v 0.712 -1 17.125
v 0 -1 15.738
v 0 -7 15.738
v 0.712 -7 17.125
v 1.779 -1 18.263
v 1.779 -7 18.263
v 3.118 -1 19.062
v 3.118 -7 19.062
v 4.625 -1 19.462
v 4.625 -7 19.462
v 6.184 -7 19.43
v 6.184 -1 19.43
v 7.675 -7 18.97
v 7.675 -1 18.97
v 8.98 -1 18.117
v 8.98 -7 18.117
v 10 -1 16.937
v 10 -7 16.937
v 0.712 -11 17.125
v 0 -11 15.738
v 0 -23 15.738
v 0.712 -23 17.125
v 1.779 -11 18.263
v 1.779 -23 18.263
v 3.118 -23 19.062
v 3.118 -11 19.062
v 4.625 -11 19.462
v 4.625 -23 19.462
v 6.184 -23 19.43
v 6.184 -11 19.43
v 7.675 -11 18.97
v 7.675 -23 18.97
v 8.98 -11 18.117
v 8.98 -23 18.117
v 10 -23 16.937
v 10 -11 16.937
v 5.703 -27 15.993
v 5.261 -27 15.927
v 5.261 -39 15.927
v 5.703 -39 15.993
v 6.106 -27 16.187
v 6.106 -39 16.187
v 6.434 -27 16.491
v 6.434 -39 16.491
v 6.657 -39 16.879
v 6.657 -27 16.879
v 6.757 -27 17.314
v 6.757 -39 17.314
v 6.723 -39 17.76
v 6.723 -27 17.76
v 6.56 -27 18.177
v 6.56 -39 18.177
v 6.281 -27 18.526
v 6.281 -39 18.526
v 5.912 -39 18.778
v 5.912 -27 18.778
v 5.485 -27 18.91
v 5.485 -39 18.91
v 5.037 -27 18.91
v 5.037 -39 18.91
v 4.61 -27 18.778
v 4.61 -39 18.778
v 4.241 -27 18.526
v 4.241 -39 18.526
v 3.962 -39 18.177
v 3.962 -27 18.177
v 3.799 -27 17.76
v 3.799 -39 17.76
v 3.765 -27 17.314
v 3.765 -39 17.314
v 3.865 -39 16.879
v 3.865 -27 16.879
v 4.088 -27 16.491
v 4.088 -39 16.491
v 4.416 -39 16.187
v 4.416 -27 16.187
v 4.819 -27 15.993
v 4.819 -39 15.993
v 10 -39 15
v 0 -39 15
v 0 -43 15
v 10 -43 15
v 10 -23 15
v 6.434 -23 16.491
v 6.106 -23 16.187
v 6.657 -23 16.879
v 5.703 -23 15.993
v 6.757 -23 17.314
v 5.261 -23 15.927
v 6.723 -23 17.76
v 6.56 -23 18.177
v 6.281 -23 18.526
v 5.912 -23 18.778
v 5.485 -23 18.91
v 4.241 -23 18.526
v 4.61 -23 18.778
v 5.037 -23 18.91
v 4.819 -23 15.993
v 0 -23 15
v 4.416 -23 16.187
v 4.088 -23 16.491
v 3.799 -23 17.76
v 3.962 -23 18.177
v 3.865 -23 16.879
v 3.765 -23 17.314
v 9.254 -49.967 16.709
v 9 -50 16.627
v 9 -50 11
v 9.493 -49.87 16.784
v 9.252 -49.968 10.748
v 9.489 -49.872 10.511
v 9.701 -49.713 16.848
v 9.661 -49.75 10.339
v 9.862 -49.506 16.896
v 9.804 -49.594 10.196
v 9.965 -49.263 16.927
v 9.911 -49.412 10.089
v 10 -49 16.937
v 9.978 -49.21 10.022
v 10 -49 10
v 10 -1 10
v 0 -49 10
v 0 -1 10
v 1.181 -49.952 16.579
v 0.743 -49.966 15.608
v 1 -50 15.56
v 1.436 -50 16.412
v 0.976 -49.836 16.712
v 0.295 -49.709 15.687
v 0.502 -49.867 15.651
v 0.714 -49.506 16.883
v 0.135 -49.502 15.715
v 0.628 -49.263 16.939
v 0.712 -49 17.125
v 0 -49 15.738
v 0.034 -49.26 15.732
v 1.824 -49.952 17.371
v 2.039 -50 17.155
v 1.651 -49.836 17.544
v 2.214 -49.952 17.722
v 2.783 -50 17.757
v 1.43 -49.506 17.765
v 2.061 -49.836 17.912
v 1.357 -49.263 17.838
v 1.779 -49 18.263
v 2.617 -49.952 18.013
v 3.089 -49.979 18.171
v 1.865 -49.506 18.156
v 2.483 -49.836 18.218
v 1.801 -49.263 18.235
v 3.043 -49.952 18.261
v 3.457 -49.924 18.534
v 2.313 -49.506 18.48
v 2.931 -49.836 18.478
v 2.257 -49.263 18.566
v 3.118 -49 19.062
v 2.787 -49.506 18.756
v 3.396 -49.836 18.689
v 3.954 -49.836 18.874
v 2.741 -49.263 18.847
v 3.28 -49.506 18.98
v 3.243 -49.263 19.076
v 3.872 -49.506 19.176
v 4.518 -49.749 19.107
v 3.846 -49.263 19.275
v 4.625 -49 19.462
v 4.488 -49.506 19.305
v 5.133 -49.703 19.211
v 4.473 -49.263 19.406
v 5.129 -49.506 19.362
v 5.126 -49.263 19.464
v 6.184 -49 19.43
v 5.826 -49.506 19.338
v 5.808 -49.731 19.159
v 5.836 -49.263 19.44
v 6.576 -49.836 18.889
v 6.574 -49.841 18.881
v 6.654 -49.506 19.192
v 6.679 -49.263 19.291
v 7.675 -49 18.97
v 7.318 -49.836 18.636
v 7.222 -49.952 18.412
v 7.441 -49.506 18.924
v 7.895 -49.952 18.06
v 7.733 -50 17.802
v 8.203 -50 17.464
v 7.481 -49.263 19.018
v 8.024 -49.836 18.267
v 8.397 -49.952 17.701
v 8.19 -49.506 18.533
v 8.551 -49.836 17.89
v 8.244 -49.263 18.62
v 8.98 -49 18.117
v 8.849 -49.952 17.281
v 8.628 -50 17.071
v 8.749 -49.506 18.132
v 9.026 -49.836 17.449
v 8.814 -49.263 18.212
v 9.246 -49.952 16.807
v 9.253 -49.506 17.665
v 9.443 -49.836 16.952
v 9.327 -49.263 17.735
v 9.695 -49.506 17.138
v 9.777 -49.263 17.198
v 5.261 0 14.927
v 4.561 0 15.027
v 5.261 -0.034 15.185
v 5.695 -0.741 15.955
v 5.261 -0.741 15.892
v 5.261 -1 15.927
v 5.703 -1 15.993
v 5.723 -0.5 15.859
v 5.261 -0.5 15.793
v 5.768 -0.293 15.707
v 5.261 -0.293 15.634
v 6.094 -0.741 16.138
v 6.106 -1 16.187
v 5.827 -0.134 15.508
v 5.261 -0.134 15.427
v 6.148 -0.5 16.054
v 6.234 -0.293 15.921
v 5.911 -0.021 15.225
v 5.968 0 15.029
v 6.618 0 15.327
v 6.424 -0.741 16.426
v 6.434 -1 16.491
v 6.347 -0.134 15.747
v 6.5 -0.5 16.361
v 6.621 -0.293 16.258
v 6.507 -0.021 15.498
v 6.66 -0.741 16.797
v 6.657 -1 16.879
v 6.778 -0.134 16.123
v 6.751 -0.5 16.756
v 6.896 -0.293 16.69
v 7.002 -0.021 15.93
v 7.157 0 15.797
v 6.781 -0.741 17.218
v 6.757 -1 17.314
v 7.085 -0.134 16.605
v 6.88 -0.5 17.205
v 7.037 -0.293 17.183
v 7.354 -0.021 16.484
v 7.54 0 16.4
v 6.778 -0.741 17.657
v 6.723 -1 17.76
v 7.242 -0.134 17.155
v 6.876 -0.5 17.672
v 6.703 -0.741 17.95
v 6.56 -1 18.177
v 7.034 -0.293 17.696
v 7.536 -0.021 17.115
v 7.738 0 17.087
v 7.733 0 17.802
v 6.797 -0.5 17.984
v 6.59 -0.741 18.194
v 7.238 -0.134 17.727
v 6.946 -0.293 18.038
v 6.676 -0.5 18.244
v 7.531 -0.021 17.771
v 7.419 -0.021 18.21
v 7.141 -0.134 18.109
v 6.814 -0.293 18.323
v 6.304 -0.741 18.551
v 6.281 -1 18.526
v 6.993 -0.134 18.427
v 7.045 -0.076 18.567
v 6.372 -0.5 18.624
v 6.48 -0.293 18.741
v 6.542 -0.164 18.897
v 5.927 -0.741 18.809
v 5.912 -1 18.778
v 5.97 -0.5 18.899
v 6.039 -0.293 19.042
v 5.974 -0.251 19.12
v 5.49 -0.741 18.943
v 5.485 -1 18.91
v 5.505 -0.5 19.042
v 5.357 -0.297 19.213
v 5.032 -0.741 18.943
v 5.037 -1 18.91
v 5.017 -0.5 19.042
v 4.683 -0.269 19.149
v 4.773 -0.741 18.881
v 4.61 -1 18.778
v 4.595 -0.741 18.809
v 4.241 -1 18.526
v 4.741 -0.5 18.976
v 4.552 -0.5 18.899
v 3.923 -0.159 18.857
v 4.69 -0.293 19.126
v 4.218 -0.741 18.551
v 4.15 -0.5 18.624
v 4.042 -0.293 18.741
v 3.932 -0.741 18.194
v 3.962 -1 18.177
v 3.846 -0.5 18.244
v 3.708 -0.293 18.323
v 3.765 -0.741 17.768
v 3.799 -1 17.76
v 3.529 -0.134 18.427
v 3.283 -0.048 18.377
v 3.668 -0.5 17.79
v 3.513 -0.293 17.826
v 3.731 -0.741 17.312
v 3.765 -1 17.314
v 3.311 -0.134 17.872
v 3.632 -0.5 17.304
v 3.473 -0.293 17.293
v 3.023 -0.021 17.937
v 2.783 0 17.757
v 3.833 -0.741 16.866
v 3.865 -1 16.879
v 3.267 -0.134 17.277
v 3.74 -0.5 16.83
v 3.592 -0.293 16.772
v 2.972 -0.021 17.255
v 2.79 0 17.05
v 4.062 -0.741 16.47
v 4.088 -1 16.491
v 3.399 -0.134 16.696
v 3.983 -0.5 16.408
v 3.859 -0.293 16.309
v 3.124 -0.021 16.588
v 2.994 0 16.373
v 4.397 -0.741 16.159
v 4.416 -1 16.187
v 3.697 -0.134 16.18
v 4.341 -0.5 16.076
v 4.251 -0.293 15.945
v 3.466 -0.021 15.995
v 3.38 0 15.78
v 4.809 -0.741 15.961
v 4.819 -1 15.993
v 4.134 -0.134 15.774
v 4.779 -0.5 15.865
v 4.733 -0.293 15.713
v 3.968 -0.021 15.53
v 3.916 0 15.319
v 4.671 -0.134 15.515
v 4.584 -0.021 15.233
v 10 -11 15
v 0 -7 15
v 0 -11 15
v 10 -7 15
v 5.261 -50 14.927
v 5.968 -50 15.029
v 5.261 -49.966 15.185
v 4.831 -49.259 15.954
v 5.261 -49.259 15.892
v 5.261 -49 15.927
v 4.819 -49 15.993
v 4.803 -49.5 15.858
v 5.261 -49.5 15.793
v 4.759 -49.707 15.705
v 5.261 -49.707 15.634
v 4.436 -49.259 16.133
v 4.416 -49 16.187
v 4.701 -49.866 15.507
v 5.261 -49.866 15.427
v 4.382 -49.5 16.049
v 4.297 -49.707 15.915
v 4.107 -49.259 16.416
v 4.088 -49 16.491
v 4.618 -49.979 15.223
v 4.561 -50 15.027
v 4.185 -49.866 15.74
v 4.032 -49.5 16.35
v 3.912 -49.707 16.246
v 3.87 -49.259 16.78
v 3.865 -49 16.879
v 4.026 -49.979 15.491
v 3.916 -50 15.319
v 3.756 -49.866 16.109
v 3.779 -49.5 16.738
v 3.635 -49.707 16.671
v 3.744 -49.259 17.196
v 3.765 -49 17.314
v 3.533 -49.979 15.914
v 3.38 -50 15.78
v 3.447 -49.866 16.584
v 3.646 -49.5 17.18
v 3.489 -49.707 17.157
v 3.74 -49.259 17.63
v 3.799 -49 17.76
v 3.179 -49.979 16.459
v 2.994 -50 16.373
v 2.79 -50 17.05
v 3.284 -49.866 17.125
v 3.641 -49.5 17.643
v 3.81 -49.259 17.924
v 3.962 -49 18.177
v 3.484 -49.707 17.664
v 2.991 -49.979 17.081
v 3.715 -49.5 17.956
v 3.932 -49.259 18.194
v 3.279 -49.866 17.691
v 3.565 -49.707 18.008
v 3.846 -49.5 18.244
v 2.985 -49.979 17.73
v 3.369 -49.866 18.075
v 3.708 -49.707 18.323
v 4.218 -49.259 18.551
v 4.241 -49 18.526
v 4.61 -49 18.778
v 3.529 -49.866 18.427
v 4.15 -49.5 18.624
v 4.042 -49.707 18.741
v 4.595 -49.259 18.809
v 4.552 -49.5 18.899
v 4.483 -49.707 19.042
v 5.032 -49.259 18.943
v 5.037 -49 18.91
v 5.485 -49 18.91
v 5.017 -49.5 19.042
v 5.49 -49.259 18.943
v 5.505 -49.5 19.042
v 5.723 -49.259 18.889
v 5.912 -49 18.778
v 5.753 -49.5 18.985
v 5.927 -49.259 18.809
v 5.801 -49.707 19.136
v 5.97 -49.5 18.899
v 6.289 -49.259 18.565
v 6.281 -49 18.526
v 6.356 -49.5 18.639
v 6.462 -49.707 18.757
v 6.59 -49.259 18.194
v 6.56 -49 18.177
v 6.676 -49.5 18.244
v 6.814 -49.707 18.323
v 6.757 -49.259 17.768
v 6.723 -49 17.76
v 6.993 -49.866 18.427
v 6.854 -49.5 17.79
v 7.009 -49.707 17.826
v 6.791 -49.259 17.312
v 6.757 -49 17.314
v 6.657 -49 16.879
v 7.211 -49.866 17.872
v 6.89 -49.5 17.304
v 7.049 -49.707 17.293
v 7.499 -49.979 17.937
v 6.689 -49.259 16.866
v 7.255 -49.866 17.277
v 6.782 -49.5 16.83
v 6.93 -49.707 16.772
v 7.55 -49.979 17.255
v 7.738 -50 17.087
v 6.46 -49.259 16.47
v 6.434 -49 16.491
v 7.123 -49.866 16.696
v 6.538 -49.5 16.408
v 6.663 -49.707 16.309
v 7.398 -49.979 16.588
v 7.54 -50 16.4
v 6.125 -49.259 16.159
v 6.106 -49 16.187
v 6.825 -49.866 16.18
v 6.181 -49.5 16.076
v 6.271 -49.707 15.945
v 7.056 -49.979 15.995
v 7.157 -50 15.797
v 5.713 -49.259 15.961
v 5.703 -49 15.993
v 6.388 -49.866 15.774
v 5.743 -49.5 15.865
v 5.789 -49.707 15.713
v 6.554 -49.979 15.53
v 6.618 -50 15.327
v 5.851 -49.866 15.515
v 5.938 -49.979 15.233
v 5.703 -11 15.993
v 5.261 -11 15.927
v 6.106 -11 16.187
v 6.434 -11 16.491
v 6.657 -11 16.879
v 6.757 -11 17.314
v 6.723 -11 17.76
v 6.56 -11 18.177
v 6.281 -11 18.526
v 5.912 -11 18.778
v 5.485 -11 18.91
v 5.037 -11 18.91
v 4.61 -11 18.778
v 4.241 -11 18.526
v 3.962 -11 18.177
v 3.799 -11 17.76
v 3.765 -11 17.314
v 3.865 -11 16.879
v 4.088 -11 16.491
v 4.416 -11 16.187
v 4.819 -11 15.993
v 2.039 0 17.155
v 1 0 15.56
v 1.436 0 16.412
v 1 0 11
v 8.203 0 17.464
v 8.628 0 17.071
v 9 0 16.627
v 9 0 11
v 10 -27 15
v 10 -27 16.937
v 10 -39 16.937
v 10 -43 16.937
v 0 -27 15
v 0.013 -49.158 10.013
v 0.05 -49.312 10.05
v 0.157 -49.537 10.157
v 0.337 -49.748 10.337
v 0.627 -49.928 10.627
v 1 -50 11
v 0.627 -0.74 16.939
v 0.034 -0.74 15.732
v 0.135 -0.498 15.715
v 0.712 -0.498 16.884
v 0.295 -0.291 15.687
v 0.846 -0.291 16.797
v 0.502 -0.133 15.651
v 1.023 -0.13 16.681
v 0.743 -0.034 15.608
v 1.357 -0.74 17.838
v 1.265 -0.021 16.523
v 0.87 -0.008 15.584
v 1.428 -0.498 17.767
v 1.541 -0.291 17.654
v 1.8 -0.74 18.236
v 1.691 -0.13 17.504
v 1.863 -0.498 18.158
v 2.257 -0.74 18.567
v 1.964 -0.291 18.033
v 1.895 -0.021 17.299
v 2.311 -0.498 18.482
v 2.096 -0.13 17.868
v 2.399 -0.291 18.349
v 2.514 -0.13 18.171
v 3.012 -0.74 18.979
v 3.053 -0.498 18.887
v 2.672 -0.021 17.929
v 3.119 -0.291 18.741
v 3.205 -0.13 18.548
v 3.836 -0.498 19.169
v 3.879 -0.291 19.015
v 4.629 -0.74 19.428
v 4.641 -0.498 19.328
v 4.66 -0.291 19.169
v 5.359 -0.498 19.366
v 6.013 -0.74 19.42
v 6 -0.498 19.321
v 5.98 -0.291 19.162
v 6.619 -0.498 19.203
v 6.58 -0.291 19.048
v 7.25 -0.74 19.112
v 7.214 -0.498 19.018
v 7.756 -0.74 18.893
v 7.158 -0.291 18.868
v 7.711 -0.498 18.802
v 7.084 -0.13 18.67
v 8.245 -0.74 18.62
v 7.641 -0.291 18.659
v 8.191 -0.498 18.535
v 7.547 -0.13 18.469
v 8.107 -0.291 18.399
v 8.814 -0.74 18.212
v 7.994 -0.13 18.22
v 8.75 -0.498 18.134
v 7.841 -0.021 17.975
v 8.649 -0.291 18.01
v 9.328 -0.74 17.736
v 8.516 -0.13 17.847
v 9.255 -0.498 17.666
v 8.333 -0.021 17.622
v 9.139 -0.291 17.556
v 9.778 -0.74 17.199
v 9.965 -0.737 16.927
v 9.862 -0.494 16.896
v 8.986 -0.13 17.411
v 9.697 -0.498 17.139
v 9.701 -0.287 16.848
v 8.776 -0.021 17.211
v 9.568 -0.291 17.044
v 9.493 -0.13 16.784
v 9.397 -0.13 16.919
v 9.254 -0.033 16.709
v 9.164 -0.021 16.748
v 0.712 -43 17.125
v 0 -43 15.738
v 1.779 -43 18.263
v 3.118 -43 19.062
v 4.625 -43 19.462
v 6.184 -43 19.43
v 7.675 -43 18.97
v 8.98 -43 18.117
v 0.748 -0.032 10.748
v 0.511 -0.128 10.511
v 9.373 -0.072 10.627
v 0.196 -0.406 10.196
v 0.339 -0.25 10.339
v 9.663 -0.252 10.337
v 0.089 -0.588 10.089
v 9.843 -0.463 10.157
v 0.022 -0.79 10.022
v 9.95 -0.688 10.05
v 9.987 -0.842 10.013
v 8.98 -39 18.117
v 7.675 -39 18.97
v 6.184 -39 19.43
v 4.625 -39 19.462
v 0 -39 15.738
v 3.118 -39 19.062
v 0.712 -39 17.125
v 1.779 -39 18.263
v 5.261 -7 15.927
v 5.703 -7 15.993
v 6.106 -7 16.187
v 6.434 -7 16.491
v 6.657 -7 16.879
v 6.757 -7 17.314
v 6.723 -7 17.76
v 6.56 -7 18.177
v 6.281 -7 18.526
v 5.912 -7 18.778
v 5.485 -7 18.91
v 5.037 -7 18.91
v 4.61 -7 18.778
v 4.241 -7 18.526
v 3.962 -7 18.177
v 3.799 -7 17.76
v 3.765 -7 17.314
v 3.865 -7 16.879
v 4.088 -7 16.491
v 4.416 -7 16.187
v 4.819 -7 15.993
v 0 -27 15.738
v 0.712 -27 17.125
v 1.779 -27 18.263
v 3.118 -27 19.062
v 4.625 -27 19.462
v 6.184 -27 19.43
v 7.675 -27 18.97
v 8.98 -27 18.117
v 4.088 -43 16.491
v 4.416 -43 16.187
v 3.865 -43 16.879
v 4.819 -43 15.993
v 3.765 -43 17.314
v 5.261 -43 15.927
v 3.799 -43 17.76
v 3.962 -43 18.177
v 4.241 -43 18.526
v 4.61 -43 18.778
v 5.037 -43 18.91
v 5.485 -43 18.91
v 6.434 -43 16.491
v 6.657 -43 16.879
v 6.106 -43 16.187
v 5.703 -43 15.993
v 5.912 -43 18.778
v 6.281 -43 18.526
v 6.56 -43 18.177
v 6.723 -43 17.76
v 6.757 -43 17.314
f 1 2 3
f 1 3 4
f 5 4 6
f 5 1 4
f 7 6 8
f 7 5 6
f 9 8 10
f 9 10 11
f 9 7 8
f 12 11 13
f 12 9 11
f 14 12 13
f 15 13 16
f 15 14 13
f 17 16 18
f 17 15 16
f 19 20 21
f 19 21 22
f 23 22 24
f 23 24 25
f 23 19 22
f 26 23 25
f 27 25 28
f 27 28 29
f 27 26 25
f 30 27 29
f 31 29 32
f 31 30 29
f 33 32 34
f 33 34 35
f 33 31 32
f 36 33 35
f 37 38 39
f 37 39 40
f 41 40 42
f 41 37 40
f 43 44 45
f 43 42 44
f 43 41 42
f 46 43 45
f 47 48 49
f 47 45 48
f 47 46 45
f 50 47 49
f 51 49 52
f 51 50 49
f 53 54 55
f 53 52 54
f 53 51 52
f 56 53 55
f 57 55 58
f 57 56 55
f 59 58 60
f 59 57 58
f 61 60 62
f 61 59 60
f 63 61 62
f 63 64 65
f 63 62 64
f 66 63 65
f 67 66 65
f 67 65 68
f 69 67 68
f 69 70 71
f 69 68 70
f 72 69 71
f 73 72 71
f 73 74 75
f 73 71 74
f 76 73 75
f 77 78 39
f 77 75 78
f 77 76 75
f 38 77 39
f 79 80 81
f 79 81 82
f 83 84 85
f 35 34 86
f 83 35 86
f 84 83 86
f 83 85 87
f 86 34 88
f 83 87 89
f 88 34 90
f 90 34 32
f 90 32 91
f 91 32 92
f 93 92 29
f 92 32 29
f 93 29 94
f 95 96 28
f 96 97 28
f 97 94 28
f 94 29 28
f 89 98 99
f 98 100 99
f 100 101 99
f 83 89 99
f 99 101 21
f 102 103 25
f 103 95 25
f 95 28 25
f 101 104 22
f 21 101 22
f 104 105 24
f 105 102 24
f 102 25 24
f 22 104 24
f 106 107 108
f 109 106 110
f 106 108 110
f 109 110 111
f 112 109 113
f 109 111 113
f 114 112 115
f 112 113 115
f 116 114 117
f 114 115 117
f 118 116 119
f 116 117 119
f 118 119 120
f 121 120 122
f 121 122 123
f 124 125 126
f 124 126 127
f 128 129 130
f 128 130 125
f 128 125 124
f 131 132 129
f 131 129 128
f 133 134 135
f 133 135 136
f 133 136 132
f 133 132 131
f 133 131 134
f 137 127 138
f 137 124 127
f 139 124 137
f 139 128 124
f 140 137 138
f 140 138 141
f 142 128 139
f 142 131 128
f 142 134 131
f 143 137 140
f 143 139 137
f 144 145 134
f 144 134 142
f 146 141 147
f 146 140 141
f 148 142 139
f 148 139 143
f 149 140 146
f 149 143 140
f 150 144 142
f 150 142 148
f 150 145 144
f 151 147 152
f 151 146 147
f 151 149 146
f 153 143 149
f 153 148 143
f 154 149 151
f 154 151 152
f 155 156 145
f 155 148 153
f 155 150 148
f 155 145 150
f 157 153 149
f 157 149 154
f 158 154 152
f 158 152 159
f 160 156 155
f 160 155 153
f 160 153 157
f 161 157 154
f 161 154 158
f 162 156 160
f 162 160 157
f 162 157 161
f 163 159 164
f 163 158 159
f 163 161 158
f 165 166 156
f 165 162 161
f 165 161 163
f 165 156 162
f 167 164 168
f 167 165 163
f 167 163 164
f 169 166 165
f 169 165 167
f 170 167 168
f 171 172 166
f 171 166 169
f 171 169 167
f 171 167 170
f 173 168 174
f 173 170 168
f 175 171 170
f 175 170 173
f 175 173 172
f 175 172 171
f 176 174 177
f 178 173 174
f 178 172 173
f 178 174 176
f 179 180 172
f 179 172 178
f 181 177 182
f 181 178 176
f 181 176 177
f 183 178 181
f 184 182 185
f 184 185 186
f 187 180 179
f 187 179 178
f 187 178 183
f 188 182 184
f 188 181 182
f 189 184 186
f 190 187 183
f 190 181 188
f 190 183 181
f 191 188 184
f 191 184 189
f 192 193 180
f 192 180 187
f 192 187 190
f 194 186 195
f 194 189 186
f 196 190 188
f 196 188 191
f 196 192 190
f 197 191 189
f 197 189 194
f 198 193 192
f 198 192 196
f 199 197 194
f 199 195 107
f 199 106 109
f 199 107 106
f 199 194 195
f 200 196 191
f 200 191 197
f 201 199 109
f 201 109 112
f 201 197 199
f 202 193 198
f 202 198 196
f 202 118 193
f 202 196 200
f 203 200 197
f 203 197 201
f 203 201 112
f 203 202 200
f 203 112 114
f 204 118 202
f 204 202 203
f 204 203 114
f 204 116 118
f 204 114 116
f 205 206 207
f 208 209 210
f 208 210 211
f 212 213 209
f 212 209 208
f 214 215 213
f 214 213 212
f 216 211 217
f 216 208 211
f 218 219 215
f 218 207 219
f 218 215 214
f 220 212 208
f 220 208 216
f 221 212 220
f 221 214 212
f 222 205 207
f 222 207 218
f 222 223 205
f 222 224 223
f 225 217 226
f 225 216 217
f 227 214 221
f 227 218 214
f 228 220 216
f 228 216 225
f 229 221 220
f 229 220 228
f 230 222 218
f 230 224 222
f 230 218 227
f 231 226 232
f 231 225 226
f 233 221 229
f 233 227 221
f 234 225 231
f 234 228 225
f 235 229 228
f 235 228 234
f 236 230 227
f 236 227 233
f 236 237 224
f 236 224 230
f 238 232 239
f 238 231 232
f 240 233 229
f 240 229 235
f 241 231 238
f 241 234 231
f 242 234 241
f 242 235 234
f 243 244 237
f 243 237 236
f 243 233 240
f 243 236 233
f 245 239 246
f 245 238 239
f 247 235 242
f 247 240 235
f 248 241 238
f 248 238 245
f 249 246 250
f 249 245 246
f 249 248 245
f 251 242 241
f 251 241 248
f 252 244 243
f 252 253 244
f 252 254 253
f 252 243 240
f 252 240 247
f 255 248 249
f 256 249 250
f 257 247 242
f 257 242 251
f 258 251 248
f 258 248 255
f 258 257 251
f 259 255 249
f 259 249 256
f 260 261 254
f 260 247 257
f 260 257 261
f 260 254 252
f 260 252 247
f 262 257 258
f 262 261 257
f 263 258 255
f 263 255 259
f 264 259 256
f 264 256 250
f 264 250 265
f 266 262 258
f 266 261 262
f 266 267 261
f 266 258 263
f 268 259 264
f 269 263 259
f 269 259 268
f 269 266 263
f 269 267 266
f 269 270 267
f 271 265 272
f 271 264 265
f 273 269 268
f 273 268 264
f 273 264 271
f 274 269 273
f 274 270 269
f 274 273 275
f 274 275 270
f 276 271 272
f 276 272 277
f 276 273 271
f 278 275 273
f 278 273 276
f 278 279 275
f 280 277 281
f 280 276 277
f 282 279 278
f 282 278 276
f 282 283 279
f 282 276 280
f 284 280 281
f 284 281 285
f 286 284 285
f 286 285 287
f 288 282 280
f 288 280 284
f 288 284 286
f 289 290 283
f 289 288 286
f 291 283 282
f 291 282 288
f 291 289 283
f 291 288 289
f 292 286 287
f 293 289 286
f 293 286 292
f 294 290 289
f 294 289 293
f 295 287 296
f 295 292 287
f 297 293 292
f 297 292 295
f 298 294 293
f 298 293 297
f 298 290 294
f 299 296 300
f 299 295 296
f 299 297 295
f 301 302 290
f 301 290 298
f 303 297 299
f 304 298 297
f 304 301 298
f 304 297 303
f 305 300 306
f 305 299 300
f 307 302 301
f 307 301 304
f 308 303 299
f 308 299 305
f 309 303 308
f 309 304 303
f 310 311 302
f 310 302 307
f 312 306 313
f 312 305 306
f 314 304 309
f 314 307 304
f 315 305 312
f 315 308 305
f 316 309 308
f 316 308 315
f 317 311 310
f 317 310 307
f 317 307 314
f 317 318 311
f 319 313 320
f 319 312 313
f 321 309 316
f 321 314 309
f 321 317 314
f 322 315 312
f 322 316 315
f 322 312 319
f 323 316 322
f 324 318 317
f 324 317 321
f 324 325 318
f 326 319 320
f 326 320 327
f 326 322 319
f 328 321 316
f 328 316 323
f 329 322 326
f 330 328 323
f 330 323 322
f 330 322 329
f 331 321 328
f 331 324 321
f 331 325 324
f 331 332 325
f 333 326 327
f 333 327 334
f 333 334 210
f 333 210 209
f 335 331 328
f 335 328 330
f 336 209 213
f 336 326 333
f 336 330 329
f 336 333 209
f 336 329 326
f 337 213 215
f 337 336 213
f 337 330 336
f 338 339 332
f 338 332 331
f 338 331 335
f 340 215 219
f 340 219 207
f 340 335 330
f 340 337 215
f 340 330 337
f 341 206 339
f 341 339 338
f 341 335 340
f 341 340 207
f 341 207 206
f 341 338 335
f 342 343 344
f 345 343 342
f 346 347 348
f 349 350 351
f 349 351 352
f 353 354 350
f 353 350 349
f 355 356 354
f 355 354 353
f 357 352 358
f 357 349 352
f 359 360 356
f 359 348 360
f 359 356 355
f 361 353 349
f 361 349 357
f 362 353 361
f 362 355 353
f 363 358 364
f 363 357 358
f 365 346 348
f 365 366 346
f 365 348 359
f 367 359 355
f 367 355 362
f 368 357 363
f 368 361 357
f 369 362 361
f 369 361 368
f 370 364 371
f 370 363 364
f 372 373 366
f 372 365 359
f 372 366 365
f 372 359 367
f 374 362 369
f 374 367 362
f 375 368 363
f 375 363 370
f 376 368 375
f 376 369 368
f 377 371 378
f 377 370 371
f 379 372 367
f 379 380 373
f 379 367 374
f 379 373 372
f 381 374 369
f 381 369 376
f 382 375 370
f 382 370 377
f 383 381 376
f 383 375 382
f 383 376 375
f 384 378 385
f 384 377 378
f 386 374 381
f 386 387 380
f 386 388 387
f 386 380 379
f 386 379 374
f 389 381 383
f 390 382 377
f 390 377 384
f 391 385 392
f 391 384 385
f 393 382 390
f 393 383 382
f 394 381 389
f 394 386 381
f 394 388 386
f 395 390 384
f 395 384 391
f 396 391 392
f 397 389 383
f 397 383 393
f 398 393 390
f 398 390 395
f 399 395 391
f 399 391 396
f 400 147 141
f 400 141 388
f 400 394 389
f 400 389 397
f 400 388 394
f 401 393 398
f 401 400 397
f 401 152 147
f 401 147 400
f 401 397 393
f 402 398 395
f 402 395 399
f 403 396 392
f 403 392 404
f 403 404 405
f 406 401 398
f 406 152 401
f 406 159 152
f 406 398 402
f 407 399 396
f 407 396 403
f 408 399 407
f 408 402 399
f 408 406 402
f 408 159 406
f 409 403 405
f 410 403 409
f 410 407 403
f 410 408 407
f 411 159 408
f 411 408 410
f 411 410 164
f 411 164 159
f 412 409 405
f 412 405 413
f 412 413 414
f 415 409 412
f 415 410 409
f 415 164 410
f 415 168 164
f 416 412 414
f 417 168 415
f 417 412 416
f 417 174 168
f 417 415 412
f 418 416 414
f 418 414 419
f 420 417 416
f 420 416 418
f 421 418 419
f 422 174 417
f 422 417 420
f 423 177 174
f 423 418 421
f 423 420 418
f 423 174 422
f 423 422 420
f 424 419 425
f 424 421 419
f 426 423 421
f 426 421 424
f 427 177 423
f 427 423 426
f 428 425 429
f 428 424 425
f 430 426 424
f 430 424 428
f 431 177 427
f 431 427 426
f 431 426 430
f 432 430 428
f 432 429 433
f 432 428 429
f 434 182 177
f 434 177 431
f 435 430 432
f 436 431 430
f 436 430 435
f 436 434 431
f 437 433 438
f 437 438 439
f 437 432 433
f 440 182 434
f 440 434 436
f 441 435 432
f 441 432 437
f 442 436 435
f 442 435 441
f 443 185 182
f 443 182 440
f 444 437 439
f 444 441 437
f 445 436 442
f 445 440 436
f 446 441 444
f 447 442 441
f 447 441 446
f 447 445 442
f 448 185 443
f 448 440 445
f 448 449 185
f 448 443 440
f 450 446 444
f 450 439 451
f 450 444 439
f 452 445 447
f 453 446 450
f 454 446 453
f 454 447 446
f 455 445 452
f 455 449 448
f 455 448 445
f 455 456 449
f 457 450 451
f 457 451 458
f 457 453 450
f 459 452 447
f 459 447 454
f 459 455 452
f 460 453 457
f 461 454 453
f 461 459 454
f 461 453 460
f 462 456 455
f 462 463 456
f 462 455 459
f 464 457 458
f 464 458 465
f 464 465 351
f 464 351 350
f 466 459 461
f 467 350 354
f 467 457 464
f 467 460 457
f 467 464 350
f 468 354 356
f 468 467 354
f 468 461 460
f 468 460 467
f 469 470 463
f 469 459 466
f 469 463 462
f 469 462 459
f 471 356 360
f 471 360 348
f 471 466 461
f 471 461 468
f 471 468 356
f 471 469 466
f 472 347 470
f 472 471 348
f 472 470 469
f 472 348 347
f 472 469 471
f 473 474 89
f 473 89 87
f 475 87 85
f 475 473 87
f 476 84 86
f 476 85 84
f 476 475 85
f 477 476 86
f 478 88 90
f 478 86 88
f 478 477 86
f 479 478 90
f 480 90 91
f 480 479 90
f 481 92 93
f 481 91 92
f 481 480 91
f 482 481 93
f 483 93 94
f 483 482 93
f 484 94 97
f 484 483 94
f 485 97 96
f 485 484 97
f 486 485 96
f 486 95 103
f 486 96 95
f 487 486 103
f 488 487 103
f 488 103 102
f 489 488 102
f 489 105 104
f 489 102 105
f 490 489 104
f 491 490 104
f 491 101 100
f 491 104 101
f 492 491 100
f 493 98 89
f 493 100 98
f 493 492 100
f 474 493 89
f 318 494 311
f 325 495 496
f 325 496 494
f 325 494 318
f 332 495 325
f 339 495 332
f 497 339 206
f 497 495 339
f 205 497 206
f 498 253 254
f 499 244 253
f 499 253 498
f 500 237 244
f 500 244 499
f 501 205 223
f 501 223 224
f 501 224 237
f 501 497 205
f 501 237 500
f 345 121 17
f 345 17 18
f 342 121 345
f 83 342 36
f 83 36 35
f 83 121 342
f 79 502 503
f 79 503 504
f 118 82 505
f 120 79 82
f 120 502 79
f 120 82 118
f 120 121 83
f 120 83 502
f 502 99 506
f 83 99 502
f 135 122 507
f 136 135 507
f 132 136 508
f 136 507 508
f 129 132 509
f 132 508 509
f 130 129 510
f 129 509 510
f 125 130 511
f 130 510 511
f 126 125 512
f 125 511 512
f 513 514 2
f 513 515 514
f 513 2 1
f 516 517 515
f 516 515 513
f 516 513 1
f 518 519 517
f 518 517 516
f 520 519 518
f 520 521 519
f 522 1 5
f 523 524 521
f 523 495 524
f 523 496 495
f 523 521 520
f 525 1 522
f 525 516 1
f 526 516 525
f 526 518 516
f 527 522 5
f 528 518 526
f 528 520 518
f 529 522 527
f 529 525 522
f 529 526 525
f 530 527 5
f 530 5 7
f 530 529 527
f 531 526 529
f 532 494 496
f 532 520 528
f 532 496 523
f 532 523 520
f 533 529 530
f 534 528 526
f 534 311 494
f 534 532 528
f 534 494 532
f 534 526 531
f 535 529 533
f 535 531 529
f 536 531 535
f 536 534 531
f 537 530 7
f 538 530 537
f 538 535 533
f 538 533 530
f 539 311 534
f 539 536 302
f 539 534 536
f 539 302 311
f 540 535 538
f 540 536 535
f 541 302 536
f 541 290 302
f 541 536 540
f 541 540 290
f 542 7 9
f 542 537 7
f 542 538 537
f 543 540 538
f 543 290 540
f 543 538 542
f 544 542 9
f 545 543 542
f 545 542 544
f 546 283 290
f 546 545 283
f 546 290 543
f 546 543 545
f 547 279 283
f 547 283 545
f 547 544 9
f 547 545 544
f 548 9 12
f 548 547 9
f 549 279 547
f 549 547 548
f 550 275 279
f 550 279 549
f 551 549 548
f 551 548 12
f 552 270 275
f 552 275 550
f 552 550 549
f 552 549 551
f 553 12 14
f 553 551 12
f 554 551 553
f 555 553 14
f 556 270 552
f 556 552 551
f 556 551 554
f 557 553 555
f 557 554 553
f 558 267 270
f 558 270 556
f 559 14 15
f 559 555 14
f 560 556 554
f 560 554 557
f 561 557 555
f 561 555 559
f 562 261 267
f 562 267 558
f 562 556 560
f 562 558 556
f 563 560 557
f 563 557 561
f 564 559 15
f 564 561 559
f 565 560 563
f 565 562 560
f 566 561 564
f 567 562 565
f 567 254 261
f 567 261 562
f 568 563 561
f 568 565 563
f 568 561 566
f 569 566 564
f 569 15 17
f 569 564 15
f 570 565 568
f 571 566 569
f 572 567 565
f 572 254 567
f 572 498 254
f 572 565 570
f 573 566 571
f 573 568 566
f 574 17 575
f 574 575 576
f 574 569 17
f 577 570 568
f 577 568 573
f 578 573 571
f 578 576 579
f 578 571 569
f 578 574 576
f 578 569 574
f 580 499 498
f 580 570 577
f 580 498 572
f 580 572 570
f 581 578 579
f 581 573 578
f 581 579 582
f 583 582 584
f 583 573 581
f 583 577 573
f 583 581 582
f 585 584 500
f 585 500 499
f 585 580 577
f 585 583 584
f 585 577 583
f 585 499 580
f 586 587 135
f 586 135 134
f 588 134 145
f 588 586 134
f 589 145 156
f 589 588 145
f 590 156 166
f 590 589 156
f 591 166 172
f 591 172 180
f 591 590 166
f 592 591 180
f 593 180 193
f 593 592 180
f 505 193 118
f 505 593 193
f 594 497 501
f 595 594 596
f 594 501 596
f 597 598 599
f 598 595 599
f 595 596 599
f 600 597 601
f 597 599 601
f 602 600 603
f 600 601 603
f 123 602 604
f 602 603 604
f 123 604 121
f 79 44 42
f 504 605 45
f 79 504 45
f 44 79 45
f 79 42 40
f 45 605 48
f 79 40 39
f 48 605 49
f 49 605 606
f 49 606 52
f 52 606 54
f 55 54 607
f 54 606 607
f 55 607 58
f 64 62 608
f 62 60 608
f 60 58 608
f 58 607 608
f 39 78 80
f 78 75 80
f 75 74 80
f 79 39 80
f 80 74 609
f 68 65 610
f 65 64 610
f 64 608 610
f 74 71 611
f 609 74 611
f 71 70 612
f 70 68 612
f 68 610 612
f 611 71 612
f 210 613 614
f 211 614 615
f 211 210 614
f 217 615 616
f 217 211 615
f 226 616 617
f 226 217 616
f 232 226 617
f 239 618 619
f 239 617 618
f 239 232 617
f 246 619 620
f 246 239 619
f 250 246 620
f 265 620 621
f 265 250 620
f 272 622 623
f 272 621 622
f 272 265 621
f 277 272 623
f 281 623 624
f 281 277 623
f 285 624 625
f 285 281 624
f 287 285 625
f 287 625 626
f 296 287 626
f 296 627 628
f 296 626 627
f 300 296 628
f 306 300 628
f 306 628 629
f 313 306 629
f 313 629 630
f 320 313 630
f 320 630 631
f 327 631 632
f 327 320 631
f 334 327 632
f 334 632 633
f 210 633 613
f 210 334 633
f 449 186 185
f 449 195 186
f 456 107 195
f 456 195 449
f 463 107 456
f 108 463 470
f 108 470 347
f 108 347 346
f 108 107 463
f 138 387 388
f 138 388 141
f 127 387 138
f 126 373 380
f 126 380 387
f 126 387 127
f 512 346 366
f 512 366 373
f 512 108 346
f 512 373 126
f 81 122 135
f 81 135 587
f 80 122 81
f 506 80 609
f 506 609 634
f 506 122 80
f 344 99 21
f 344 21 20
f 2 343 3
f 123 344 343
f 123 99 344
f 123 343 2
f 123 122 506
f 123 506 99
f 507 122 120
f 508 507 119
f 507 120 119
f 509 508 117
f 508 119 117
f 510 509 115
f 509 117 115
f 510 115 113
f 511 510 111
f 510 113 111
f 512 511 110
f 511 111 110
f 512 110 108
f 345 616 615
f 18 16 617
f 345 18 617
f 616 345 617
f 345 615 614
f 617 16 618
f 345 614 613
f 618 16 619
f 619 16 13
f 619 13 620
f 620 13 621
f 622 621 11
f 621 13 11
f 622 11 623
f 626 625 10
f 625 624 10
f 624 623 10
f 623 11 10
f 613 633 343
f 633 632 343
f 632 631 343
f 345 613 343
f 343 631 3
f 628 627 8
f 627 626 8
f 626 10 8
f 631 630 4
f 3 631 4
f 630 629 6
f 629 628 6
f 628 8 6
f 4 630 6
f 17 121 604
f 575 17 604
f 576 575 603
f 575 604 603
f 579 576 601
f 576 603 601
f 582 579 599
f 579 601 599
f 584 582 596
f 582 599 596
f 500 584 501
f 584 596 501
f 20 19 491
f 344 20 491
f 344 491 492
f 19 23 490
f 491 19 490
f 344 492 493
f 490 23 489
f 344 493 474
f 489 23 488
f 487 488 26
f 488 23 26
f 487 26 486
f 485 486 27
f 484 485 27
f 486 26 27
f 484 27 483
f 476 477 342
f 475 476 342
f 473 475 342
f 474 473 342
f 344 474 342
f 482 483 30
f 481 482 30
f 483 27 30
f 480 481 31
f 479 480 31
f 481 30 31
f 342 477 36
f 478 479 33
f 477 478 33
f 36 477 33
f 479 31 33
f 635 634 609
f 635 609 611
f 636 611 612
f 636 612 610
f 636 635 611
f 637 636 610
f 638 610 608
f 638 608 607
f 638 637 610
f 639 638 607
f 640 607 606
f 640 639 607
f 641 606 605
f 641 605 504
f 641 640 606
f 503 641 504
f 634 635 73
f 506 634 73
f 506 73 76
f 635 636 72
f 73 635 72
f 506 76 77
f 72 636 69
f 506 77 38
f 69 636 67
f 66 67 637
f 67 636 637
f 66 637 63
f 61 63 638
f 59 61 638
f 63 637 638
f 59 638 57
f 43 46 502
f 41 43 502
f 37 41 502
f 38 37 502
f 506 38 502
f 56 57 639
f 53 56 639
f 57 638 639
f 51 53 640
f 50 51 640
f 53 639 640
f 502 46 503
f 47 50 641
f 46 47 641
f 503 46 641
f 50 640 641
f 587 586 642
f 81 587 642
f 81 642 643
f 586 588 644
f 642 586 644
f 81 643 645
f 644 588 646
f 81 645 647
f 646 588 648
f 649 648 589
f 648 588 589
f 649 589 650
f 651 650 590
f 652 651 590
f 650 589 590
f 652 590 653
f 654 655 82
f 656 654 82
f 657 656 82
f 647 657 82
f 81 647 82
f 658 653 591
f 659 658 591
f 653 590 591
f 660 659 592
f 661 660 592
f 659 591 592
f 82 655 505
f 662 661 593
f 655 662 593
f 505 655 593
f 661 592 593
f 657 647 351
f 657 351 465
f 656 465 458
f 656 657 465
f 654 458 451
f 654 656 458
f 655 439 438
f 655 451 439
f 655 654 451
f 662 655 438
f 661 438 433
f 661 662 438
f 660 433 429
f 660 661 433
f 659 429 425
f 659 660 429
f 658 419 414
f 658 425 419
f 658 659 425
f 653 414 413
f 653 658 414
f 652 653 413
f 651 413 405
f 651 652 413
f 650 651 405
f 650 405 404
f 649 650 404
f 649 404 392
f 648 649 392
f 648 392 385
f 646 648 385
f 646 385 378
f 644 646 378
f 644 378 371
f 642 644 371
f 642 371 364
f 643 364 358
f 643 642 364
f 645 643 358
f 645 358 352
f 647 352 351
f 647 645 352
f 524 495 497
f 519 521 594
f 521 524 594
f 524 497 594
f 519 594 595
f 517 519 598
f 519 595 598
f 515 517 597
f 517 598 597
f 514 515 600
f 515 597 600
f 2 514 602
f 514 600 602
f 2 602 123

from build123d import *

# Parameters (mm, degrees)
BOSS_EXTRUDE1_DEPTH     = 20
CUT_EXTRUDE1_DEPTH      = 5
SKETCH3_W               = 10
SKETCH3_H               = 50.00000000000001
CUT_EXTRUDE2_DEPTH      = 18.000000000000007
CUT_EXTRUDE3_DEPTH      = 45.955533585978046
CUT_EXTRUDE3_DEPTH_BACK = 45.955533585978046
SKETCH4_R               = 1.5
CUT_EXTRUDE4_DEPTH      = 55.772255750516614
CUT_EXTRUDE4_DEPTH_BACK = 55.772255750516614
FILLET1_R               = 1


with BuildPart() as part:
    # Sketch1 → Boss-Extrude1 (new body)
    with BuildSketch(Plane.XY):
        Polygon((0, 0), (10, 0), (10.000000000000007, -50), (6.12e-15, -50), align=None)
    extrude(amount=BOSS_EXTRUDE1_DEPTH)

    # Sketch2 → Cut-Extrude1 (cut)
    with BuildSketch(Plane.XY.offset(20)):
        Polygon((10.000000000000009, -7), (8.6e-16, -7), (7.6e-16, -11), (10.000000000000005, -11), align=None)
        Polygon((10.000000000000007, -23), (1.47e-15, -23), (3.8e-16, -27), (10.000000000000004, -27), align=None)
        Polygon((10.000000000000005, -39), (1.47e-15, -39), (0, -43), (10.000000000000007, -43), align=None)
    extrude(amount=-CUT_EXTRUDE1_DEPTH, mode=Mode.SUBTRACT)

    # Sketch3 → Cut-Extrude2 (cut)
    with BuildSketch(Plane(origin=(10, 1.39e-15, 0), x_dir=(0, 0, -1), z_dir=(1, 1.4e-16, 0))):
        with Locations((-5, -25.000000000000004)):
            Rectangle(SKETCH3_W, SKETCH3_H)
    extrude(amount=-CUT_EXTRUDE2_DEPTH, mode=Mode.SUBTRACT)

    # Sketch4 → Cut-Extrude3 (cut, two sides: drawn at the far end of the back side and taken through both)
    with BuildSketch(Plane.XZ.offset(39).offset(-CUT_EXTRUDE3_DEPTH_BACK)):
        with Locations(Location((5.260991578815225, 17.426547092913836, 0), (0, 0, 270))):
            Circle(SKETCH4_R)
    extrude(amount=CUT_EXTRUDE3_DEPTH + CUT_EXTRUDE3_DEPTH_BACK, mode=Mode.SUBTRACT)

    # Sketch5 → Cut-Extrude4 (cut, two sides: drawn at the far end of the back side and taken through both)
    with BuildSketch(Plane.XZ.offset(50).offset(-CUT_EXTRUDE4_DEPTH_BACK)):
        with BuildLine():
            Line((6.12e-15, 20), (0, 15.73755811618498))
            ThreePointArc((-8.9e-16, 15.73755811618498), (4.6252026328097955, 19.461842499702882), (10.000000000000007, 16.93709561624879))
            Line((10.000000000000007, 16.93709561624879), (10.000000000000007, 20))
            Line((10.000000000000007, 20), (6.12e-15, 20))
        make_face()
    extrude(amount=CUT_EXTRUDE4_DEPTH + CUT_EXTRUDE4_DEPTH_BACK, mode=Mode.SUBTRACT)

    # Fillet1
    # the kernel refuses this fillet: 1 mm, written as the material it takes off along each edge
    with BuildSketch(Plane(origin=(10, 0, 7.5), x_dir=(-1, 0, 0), z_dir=(0, 0, 1))) as fillet1_piece_1:
        with BuildLine():
            CenterArc((FILLET1_R, FILLET1_R), FILLET1_R, 180, 90)
            Line((0, FILLET1_R), (0, 0))
            Line((0, 0), (FILLET1_R, 0))
        make_face()
    extrude(amount=11.93709561624879, mode=Mode.SUBTRACT)
    with BuildSketch(Plane(origin=(0, 0, 7.5), x_dir=(1, 0, 0), z_dir=(0, 0, 1))) as fillet1_piece_2:
        with BuildLine():
            CenterArc((FILLET1_R, -FILLET1_R), FILLET1_R, 90, 90)
            Line((2.2e-16, -FILLET1_R), (0, 0))
            Line((0, 0), (FILLET1_R, 0))
        make_face()
    extrude(amount=10.737558116184978, mode=Mode.SUBTRACT)
    with BuildSketch(Plane(origin=(6.12e-15, -50, 7.5), x_dir=(-1.3e-16, 1, 0), z_dir=(0, 0, 1))) as fillet1_piece_3:
        with BuildLine():
            CenterArc((FILLET1_R, -FILLET1_R), FILLET1_R, 90, 89.99999999999997)
            Line((-1.3e-16, -FILLET1_R), (0, 0))
            Line((0, 0), (FILLET1_R, 0))
        make_face()
    extrude(amount=10.737558116184978, mode=Mode.SUBTRACT)
    with BuildSketch(Plane(origin=(10.000000000000007, -50, 7.5), x_dir=(0, 1, 0), z_dir=(0, 0, 1))) as fillet1_piece_4:
        with BuildLine():
            CenterArc((FILLET1_R, FILLET1_R), FILLET1_R, 180, 90)
            Line((0, FILLET1_R), (0, 0))
            Line((0, 0), (FILLET1_R, 0))
        make_face()
    extrude(amount=11.93709561624879, mode=Mode.SUBTRACT)
    with BuildSketch(Plane(origin=(5.292490697981418, -50, 13.898964597710425), x_dir=(-0.9937101746292788, 0, -0.11198253809522406), z_dir=(0.11198253809522406, 0, -0.9937101746292788))) as fillet1_piece_5:
        with BuildLine():
            CenterArc((5.602756813783422 - FILLET1_R, FILLET1_R), FILLET1_R, 270, 90)
            Line((5.602756813783423, FILLET1_R), (5.602756813783422, 0))
            Line((5.602756813783422, 0), (5.602756813783422 - FILLET1_R, 0))
        make_face()
    revolve(axis=Axis((5.292490697981418, -50, 13.898964597710425), (0, 1, 0)), revolution_arc=179.17890353520545, mode=Mode.SUBTRACT)
    with BuildSketch(Plane(origin=(5.292490697981418, 0, 13.898964597710425), x_dir=(-0.9937101746292788, 0, -0.11198253809522406), z_dir=(0.11198253809522406, 0, -0.9937101746292788))) as fillet1_piece_6:
        with BuildLine():
            CenterArc((5.602756813783421 - FILLET1_R, -FILLET1_R), FILLET1_R, 0, 90)
            Line((5.602756813783421, -FILLET1_R), (5.602756813783421, 0))
            Line((5.602756813783421, 0), (5.602756813783421 - FILLET1_R, 0))
        make_face()
    revolve(axis=Axis((5.292490697981418, 0, 13.898964597710425), (0, 1, 0)), revolution_arc=179.17890353520545, mode=Mode.SUBTRACT)
    with BuildSketch(Plane(origin=(12.500000000000007, -50, 10), x_dir=(-1.4e-16, 1, 0), z_dir=(-1, -1.4e-16, 0))) as fillet1_piece_7:
        with BuildLine():
            CenterArc((FILLET1_R, -FILLET1_R), FILLET1_R, 90, 90)
            Line((0, -FILLET1_R), (0, 0))
            Line((0, 0), (FILLET1_R, 0))
        make_face()
    extrude(amount=15.000000000000002, mode=Mode.SUBTRACT)
    with BuildSketch(Plane(origin=(12.5, 0, 10), x_dir=(0, 0, 1), z_dir=(-1, -1.4e-16, 0))) as fillet1_piece_8:
        with BuildLine():
            CenterArc((FILLET1_R, -FILLET1_R), FILLET1_R, 90, 90)
            Line((0, -FILLET1_R), (0, 0))
            Line((0, 0), (FILLET1_R, 0))
        make_face()
    extrude(amount=15, mode=Mode.SUBTRACT)
    with BuildSketch(Plane(origin=(5.260991578815225, 0, 17.426547092913836), x_dir=(0, 0, -1), z_dir=(-1, 0, 0))) as fillet1_piece_9:
        with BuildLine():
            CenterArc((1.5 + FILLET1_R, FILLET1_R), FILLET1_R, 180, 90)
            Line((1.5, FILLET1_R), (1.5, 0))
            Line((1.5, 0), (1.5 + FILLET1_R, 0))
        make_face()
    revolve(axis=Axis((5.260991578815225, 0, 17.426547092913836), (0, -1, 0)), mode=Mode.SUBTRACT)
    with BuildSketch(Plane(origin=(5.260991578815225, -50, 17.426547092913836), x_dir=(0, 0, -1), z_dir=(1, 0, 0))) as fillet1_piece_10:
        with BuildLine():
            CenterArc((1.5 + FILLET1_R, FILLET1_R), FILLET1_R, 180, 90)
            Line((1.5, FILLET1_R), (1.5, 0))
            Line((1.5, 0), (1.5 + FILLET1_R, 0))
        make_face()
    revolve(axis=Axis((5.260991578815225, -50, 17.426547092913836), (0, 1, 0)), mode=Mode.SUBTRACT)


solid = part.part
